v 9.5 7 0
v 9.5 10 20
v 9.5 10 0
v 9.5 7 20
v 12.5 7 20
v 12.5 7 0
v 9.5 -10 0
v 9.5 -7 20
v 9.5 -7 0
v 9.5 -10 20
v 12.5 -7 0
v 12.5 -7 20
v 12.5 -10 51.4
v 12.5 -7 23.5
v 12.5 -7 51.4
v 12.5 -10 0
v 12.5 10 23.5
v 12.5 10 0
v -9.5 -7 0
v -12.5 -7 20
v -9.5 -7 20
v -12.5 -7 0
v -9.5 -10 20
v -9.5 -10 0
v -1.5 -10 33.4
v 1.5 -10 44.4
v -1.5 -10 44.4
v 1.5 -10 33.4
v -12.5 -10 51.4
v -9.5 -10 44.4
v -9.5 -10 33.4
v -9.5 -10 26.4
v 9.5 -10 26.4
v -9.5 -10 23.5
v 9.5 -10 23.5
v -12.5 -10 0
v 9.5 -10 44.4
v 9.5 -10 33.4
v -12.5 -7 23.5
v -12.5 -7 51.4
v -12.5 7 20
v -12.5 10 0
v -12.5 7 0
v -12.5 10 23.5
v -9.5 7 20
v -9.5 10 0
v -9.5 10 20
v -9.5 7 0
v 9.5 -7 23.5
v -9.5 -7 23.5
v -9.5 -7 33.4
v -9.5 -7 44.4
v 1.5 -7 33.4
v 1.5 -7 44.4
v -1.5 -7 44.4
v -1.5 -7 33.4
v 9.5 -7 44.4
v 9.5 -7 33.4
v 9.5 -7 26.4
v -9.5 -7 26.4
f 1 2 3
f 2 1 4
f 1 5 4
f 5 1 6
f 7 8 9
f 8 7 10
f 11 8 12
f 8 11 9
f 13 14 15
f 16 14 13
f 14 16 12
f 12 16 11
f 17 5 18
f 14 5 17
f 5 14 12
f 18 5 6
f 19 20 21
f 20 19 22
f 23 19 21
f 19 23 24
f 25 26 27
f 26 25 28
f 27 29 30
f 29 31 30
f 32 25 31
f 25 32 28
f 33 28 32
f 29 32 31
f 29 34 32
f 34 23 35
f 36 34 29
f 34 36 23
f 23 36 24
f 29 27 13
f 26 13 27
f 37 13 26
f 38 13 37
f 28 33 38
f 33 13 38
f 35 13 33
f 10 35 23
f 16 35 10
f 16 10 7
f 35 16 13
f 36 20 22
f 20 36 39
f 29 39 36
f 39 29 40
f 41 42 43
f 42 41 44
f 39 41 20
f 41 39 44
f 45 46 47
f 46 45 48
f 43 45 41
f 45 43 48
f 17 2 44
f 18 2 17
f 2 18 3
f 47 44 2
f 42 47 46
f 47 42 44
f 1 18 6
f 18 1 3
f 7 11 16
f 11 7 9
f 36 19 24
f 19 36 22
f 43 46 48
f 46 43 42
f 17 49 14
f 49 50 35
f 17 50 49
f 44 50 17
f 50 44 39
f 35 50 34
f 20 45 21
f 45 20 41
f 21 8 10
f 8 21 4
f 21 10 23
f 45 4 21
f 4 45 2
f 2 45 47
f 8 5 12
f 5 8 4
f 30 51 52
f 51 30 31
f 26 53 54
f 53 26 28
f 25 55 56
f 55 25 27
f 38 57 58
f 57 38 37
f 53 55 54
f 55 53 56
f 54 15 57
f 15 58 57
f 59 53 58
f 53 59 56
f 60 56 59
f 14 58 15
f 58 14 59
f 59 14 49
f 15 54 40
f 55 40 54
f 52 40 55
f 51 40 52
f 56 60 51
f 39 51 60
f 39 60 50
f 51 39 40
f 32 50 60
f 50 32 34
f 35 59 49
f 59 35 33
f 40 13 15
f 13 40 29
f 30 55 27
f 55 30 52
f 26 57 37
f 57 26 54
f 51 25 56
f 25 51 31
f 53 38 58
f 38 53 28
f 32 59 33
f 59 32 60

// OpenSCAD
length = 20;
width  =25;
depth = 3.5;;

// parametersfor the  legs  - legs have square cross section

cross =3;
leg_length =20;


echo(" length table is ", length, " mm");
 echo(" width table is ", width, " mm");
echo(" depth table top is ", depth, " mm");
 echo(" width table leg is ", cross, " mm");
 echo(" height table leg is ", leg_length, " mm");
 echo(" overall height table  is ", leg_length + depth, " mm");

overall_height = 25;
leg_len =3;
width_vertical_bar = 3;
width_horizontal_bar =7;

overall_width = width;
thickness =cross;


union()
{
translate([0,0,leg_length+depth])
rotate([180,0,0])
table();
translate([0,-l+thickness,hoh + leg_len + leg_length +  depth-0.1 ])
rotate([90,0,0])
chair_back();

}


l = length/2;
w = width/2;

how = overall_width/2;
hoh = overall_height/2;
ll = -hoh - leg_len;
wvb = width_vertical_bar;
whb = width_horizontal_bar;
hwvb = wvb/2;



module table()
{

/*
   polyhedron command
  by pmoews
*/
polyhedron
       (points = [
                 [ -w,  l, 0],
                 [ -w, -l, 0],
                 [  w, -l, 0],
                 [  w,  l, 0],
                 [ -w,  l,  depth],
                 [ -w, -l,  depth],
                 [  w, -l,  depth],
                 [  w,  l,  depth],
                 [  w-cross, -l,  depth],
                 [  w-cross, cross-l,  depth],
                 [  w, cross-l,  depth],
                 [  w, -l,  leg_length + depth],
                 [  w-cross, -l,  leg_length + depth],
                 [  w-cross, cross-l,  leg_length + depth],
                 [  w, cross-l,  leg_length + depth],
                 [  w,  l-cross,  depth],
                 [  w-cross,  l-cross,  depth],
                 [  w-cross,  l,  depth],
                 [  w,  l,  leg_length + depth],
                 [  w,  l-cross,  leg_length + depth],
                 [  w-cross,  l-cross,  leg_length + depth],
                 [  w-cross,  l,  leg_length + depth],
                 [ cross-w,  l,  depth],
                 [ cross-w,  l-cross,  depth],
                 [ -w,  l-cross,  depth],
                 [ -w,  l,  leg_length + depth],
                 [ cross-w,  l,  leg_length + depth],
                 [ cross-w,  l-cross,  leg_length + depth],
                 [ -w,  l-cross,  leg_length + depth],
                 [ -w, cross-l,  depth],
                 [ cross-w, cross-l,  depth],
                 [ cross-w, -l,  depth],
                 [ -w, -l,  leg_length + depth],
                 [ -w, cross-l,  leg_length + depth],
                 [ cross-w, cross-l,  leg_length + depth],
                 [ cross-w, -l,  leg_length + depth],
                ],
           triangles = [
                 [   14,   10,   11],[    6,   11,   10],
                 [   11,    6,   12],[    8,   12,    6],
                 [   12,    8,   13],[    9,   13,    8],
                 [   13,    9,   14],[    9,   10,   14],
                 [   17,   21,   16],[   20,   16,   21],
                 [   16,   20,   15],[   19,   15,   20],
                 [   15,   19,    7],[   18,    7,   19],
                 [    7,   18,   17],[   18,   21,   17],
                 [   24,   28,   23],[   27,   23,   28],
                 [   23,   27,   22],[   26,   22,   27],
                 [   22,   26,    4],[   25,    4,   26],
                 [    4,   25,   24],[   25,   28,   24],
                 [   31,   35,   30],[   34,   30,   35],
                 [   30,   34,   29],[   33,   29,   34],
                 [   29,   33,    5],[   32,    5,   33],
                 [    5,   32,   31],[   32,   35,   31],
                 [   13,   14,   11],[   13,   11,   12],
                 [   20,   21,   18],[   20,   18,   19],
                 [   27,   28,   25],[   27,   25,   26],
                 [   34,   35,   32],[   34,   32,   33],
                 [    2,    3,    0],[    2,    0,    1],
                 [   16,    9,   30],[   16,   30,   23],
                 [   10,    2,    6],[    7,    3,   15],
                 [   10,   15,    3],[   10,    3,    2],
                 [    7,   17,    3],[   22,    4,    0],
                 [    0,    3,   17],[    0,   17,   22],
                 [    4,   24,    0],[   29,    5,    1],
                 [    1,    0,   24],[    1,   24,   29],
                 [    5,   31,    1],[    8,    6,    2],
                 [    2,    1,   31],[    2,   31,    8],
                 [   10,    9,   16],[   10,   16,   15],
                 [   24,   23,   30],[   24,   30,   29],
                 [    9,    8,   31],[    9,   31,   30],
                 [   17,   16,   23],[   17,   23,   22],
                 ]
      );

}



module chair_back()
{


/*
   polyhedron command by
   pmoews
*/
polyhedron
       (points = [
                 [ -how, -hoh + whb,   0.0],
                 [ -how + wvb, -hoh + whb,   0.0],
                 [  -hwvb, -hoh + whb,   0.0],
                 [   hwvb, -hoh + whb,   0.0],
                 [  how - wvb, -hoh + whb,   0.0],
                 [  how, -hoh + whb,   0.0],
                 [  how,  hoh - whb,   0.0],
                 [  how - wvb,  hoh - whb,   0.0],
                 [   hwvb,  hoh - whb,   0.0],
                 [  -hwvb,  hoh - whb,   0.0],
                 [ -how + wvb,  hoh - whb,   0.0],
                 [ -how,  hoh - whb,   0.0],
                 [  how,  hoh,   0.0],
                 [  how - wvb,  hoh,   0.0],
                 [   hwvb,  hoh,   0.0],
                 [  -hwvb,  hoh,   0.0],
                 [ -how + wvb,  hoh,   0.0],
                 [ -how,  hoh,   0.0],
                 [ -how, -hoh,   0.0],
                 [ -how + wvb, -hoh,   0.0],
                 [  -hwvb, -hoh,   0.0],
                 [   hwvb, -hoh,   0.0],
                 [  how - wvb, -hoh,   0.0],
                 [  how, -hoh,   0.0],
                 [  how, ll,   0.0],
                 [  how - wvb, ll,   0.0],
                 [ -how + wvb, ll,   0.0],
                 [ -how, ll,   0.0],
                 [ -how, -hoh + whb,   thickness],
                 [ -how + wvb, -hoh + whb,   thickness],
                 [  -hwvb, -hoh + whb,   thickness],
                 [   hwvb, -hoh + whb,   thickness],
                 [  how - wvb, -hoh + whb,   thickness],
                 [  how, -hoh + whb,   thickness],
                 [  how,  hoh - whb,   thickness],
                 [  how - wvb,  hoh - whb,   thickness],
                 [   hwvb,  hoh - whb,   thickness],
                 [  -hwvb,  hoh - whb,   thickness],
                 [ -how + wvb,  hoh - whb,   thickness],
                 [ -how,  hoh - whb,   thickness],
                 [  how,  hoh,   thickness],
                 [  how - wvb,  hoh,   thickness],
                 [   hwvb,  hoh,   thickness],
                 [  -hwvb,  hoh,   thickness],
                 [ -how + wvb,  hoh,   thickness],
                 [ -how,  hoh,   thickness],
                 [ -how, -hoh,   thickness],
                 [ -how + wvb, -hoh,   thickness],
                 [  -hwvb, -hoh,   thickness],
                 [   hwvb, -hoh,   thickness],
                 [  how - wvb, -hoh,   thickness],
                 [  how, -hoh,   thickness],
                 [  how, ll,   thickness],
                 [  how - wvb, ll,   thickness],
                 [ -how + wvb, ll,   thickness],
                 [ -how, ll,   thickness],
                ],
           triangles = [
                 [   11,    0,   10],[    1,   10,    0],
                 [   10,    1,   38],[   29,   38,    1],
                 [   38,   29,   39],[   28,   39,   29],
                 [   39,   28,   11],[   28,    0,   11],
                 [    9,    2,    8],[    3,    8,    2],
                 [    8,    3,   36],[   31,   36,    3],
                 [   36,   31,   37],[   30,   37,   31],
                 [   37,   30,    9],[   30,    2,    9],
                 [    7,    4,    6],[    5,    6,    4],
                 [    6,    5,   34],[   33,   34,    5],
                 [   34,   33,   35],[   32,   35,   33],
                 [   35,   32,    7],[   32,    4,    7],
                 [   18,   27,   19],[   26,   19,   27],
                 [   19,   26,   47],[   54,   47,   26],
                 [   47,   54,   46],[   55,   46,   54],
                 [   46,   55,   18],[   55,   27,   18],
                 [   22,   25,   23],[   24,   23,   25],
                 [   23,   24,   51],[   52,   51,   24],
                 [   51,   52,   50],[   53,   50,   52],
                 [   50,   53,   22],[   53,   25,   22],
                 [   24,   25,   53],[   24,   53,   52],
                 [   26,   27,   55],[   26,   55,   54],
                 [   16,   17,   11],[   16,   11,   10],
                 [   15,   16,   10],[   15,   10,    9],
                 [   14,   15,    9],[   14,    9,    8],
                 [   13,   14,    8],[   13,    8,    7],
                 [   12,   13,    7],[   12,    7,    6],
                 [   38,   39,   45],[   38,   45,   44],
                 [   37,   38,   44],[   37,   44,   43],
                 [   36,   37,   43],[   36,   43,   42],
                 [   35,   36,   42],[   35,   42,   41],
                 [   34,   35,   41],[   34,   41,   40],
                 [    1,    0,   18],[    1,   18,   19],
                 [    2,    1,   19],[    2,   19,   20],
                 [    3,    2,   20],[    3,   20,   21],
                 [    4,    3,   21],[    4,   21,   22],
                 [    5,    4,   22],[    5,   22,   23],
                 [   47,   46,   28],[   47,   28,   29],
                 [   48,   47,   29],[   48,   29,   30],
                 [   49,   48,   30],[   49,   30,   31],
                 [   50,   49,   31],[   50,   31,   32],
                 [   51,   50,   32],[   51,   32,   33],
                 [   45,   17,   16],[   45,   16,   44],
                 [   44,   16,   15],[   44,   15,   43],
                 [   43,   15,   14],[   43,   14,   42],
                 [   42,   14,   13],[   42,   13,   41],
                 [   41,   13,   12],[   41,   12,   40],
                 [   11,   17,   45],[   11,   45,   39],
                 [   12,    6,   34],[   12,   34,   40],
                 [    9,   10,   38],[    9,   38,   37],
                 [    7,    8,   36],[    7,   36,   35],
                 [   18,    0,   28],[   18,   28,   46],
                 [   23,   51,   33],[   23,   33,    5],
                 [   30,   29,    1],[   30,    1,    2],
                 [   32,   31,    3],[   32,    3,    4],
                 [   20,   19,   47],[   20,   47,   48],
                 [   22,   21,   49],[   22,   49,   50],
                 [   21,   20,   48],[   21,   48,   49],
                 ]                   );
}
